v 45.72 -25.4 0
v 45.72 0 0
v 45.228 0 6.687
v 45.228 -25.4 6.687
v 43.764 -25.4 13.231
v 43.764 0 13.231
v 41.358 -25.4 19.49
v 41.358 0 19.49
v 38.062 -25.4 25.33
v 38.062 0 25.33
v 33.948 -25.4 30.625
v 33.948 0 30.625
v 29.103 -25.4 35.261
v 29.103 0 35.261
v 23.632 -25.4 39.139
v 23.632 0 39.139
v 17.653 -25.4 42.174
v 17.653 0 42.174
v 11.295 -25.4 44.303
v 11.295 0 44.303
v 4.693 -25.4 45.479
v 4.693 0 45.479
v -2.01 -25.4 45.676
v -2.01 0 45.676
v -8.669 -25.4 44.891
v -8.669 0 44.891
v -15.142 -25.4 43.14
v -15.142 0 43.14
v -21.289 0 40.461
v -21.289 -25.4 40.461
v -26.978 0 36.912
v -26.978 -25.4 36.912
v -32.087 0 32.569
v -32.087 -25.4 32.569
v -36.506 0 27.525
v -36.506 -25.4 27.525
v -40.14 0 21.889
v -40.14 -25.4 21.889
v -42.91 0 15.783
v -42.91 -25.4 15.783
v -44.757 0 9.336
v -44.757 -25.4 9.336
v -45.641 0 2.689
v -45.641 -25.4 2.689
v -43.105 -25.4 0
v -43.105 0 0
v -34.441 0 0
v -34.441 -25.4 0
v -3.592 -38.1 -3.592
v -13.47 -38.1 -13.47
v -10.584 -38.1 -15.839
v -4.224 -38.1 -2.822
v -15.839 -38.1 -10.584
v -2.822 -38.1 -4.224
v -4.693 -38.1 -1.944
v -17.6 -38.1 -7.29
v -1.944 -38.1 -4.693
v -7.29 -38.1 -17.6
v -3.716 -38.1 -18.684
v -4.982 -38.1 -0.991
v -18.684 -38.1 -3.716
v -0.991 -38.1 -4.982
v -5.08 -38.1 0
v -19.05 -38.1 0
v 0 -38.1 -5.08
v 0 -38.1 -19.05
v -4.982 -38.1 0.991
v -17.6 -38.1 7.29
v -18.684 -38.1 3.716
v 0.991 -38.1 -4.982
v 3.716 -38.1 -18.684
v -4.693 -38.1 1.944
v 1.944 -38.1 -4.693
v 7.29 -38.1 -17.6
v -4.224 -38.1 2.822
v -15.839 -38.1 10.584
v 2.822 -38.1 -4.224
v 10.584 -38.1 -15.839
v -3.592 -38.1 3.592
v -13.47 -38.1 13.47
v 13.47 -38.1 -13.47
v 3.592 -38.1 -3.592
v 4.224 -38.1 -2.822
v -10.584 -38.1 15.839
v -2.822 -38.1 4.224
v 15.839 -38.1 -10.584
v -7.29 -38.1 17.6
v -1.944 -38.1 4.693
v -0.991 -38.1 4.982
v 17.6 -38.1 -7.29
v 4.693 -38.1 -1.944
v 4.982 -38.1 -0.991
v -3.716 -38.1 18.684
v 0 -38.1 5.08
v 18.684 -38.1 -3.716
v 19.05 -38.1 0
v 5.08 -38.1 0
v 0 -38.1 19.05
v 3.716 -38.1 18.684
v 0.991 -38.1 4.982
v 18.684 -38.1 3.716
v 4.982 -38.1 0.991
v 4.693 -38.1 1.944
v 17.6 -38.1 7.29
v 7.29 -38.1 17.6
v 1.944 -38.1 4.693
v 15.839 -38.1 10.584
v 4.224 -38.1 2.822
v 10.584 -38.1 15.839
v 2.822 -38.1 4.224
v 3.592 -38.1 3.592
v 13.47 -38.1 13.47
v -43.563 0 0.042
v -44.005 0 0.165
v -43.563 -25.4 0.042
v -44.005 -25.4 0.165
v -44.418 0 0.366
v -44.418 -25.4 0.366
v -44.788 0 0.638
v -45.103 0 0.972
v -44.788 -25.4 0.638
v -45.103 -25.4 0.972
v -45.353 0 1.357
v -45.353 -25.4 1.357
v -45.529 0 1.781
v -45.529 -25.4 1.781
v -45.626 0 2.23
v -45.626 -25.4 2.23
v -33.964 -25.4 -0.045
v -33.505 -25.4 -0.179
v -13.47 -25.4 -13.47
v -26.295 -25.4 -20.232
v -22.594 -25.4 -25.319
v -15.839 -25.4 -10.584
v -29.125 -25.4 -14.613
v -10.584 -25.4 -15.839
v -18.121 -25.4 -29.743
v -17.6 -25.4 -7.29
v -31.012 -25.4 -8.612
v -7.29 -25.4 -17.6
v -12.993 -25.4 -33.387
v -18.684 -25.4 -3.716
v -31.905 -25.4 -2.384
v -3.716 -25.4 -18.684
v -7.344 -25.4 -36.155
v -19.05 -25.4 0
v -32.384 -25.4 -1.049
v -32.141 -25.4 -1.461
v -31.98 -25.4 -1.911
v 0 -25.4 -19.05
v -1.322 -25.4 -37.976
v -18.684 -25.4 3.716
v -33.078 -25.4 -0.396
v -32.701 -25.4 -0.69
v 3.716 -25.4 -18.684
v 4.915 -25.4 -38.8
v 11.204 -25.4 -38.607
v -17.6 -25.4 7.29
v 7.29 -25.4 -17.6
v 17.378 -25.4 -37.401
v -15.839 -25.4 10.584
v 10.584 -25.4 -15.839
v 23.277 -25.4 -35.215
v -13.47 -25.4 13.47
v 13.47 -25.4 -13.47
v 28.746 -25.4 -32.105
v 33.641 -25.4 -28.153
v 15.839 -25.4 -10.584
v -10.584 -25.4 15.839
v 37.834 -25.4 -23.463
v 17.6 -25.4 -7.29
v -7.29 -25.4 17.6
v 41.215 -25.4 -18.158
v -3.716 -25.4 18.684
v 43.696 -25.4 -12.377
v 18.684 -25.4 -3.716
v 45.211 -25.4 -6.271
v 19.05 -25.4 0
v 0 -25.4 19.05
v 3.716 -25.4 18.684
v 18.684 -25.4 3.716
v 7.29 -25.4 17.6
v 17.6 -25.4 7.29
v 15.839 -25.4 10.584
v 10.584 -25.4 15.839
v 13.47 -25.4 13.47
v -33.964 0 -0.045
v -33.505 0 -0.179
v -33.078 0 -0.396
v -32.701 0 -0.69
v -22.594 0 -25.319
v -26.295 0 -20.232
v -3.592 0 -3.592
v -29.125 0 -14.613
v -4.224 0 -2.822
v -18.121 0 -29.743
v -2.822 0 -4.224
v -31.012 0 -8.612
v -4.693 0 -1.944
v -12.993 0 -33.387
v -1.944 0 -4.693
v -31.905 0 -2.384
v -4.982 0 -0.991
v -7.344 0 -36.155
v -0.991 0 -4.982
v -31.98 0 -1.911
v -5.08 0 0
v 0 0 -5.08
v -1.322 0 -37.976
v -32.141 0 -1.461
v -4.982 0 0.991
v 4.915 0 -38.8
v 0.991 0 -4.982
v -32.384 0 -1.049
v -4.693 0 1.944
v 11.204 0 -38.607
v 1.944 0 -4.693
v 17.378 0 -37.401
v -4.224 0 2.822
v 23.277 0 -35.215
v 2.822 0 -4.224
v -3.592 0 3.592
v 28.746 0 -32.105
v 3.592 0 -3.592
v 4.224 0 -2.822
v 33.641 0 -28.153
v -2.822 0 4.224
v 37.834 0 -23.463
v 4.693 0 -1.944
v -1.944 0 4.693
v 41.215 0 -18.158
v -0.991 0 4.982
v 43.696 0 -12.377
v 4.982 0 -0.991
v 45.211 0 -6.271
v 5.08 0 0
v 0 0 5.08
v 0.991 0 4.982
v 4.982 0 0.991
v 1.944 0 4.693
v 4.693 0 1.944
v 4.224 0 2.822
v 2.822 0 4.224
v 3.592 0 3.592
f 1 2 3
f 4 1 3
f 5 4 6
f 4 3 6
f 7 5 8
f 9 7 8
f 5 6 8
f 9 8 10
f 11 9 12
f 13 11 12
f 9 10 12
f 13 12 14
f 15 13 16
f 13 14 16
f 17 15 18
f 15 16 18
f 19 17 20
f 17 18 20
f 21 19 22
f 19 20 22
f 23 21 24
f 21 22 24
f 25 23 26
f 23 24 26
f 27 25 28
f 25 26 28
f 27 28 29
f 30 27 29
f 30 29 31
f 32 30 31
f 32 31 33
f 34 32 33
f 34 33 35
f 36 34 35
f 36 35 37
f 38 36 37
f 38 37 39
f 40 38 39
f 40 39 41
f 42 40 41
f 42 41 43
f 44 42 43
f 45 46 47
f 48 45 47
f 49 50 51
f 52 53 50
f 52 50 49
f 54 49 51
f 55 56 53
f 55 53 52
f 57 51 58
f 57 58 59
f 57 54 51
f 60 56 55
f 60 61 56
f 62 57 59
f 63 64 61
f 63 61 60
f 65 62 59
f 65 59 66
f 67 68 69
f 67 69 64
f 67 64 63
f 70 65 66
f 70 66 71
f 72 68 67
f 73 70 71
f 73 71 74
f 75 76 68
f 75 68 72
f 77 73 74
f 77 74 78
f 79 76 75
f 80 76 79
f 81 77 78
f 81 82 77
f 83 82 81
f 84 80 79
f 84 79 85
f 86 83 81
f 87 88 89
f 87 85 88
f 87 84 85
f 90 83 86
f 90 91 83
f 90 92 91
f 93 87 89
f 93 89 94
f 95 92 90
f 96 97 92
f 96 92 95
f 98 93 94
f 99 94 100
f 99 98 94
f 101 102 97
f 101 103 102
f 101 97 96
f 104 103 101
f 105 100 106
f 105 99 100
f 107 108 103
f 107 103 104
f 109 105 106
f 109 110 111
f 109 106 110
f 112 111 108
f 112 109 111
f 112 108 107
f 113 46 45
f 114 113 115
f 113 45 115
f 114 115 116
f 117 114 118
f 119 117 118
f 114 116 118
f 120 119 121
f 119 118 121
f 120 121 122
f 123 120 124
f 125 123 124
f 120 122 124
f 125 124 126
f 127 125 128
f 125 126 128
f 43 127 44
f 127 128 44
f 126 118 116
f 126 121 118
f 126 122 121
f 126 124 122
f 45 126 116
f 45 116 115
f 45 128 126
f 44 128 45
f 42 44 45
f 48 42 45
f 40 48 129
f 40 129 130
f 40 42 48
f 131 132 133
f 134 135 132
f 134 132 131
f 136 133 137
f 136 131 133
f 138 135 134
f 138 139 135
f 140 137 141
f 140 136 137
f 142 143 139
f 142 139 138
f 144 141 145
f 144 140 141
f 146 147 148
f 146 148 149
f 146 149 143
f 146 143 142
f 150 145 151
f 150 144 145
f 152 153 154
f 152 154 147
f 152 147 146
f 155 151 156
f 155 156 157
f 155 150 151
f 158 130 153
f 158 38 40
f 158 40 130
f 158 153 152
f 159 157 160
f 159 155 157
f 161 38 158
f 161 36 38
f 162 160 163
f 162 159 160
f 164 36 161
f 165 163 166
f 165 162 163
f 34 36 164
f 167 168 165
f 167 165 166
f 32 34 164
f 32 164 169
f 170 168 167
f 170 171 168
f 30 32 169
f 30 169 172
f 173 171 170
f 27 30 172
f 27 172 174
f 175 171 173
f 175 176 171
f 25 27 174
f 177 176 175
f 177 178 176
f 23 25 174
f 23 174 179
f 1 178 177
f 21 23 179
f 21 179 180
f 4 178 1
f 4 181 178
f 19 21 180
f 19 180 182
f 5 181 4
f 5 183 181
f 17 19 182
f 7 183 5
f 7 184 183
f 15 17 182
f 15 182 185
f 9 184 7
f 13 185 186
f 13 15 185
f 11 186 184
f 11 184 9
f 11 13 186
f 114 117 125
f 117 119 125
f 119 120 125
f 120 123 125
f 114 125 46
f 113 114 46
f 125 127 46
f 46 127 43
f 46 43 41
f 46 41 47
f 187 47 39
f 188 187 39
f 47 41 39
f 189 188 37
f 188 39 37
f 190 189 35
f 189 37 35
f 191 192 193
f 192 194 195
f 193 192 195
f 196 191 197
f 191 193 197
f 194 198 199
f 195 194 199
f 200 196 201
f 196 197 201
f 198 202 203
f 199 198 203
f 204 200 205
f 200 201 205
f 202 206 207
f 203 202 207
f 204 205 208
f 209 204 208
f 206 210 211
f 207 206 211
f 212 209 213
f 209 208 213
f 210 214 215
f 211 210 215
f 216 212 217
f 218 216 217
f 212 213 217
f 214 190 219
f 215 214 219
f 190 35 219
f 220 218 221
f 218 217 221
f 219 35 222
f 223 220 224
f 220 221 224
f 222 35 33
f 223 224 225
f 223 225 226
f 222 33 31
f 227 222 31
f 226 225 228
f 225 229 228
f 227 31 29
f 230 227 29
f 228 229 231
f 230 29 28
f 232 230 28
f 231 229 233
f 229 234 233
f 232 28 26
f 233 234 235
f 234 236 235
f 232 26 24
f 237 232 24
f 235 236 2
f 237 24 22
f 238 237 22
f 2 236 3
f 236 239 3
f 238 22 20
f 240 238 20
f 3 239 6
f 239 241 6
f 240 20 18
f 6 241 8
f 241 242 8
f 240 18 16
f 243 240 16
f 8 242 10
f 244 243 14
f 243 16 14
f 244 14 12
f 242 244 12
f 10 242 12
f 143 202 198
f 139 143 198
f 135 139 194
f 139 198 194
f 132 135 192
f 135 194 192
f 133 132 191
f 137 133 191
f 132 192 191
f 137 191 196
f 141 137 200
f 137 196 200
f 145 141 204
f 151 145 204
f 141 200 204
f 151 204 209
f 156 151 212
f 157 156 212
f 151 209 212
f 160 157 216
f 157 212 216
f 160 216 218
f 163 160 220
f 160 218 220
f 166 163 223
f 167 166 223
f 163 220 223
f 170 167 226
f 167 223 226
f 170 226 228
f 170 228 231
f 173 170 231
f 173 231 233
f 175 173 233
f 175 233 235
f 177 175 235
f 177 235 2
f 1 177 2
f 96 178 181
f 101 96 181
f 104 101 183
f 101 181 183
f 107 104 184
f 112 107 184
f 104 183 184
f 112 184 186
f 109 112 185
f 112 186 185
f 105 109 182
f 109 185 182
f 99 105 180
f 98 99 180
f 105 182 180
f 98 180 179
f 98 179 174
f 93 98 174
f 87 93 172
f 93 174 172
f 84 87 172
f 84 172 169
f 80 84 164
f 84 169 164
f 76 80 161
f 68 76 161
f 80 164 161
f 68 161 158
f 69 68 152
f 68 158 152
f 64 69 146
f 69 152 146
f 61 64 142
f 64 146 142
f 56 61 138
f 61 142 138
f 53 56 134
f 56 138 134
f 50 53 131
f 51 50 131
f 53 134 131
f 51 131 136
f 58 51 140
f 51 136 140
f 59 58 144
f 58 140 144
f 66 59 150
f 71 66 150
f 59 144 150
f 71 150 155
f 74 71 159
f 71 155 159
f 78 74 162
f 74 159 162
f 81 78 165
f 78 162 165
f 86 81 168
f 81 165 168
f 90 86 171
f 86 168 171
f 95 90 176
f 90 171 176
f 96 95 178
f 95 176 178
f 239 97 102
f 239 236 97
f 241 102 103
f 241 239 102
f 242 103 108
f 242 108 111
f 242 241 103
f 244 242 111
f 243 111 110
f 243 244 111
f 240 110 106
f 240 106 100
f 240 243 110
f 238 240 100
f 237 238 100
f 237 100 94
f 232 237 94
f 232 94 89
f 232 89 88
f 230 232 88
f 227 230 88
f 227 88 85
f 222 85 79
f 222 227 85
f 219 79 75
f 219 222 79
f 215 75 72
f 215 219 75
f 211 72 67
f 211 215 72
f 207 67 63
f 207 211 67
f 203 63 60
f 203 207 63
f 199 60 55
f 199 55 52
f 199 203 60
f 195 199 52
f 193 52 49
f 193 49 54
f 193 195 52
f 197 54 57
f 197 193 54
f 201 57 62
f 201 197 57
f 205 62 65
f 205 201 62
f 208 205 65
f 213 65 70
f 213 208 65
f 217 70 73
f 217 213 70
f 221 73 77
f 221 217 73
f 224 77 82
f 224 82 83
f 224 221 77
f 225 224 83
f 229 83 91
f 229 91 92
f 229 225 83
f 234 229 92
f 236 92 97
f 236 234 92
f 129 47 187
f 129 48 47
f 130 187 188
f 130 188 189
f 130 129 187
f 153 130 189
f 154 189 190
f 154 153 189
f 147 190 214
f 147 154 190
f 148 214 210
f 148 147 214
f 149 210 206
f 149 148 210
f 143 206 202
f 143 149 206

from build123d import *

# Parameters (mm, degrees)
F1_DEPTH = 25.4
F2_R     = 5.08
F3_DEPTH = 127
F4_R     = 2.54
F5_R     = 2.54
F6_R     = 19.05
F6_R_2   = 5.08
F7_DEPTH = 12.7


with BuildPart() as f1:
    # F0 (on Front) → F1 (new body)
    with BuildSketch(Plane.XZ):
        with BuildLine():
            ThreePointArc((-31.9786, 0), (6.8707, -38.8493), (45.72, 0))
            ThreePointArc((45.72, 0), (0, 45.72), (-45.72, 0))
            Line((-45.72, 0), (-31.9786, 0))
        make_face()
    extrude(amount=F1_DEPTH)

    # F2 (on face) → F3 (cut, symmetric)
    with BuildSketch(Plane.XZ.offset(25.4)):
        Circle(F2_R)
    extrude(amount=F3_DEPTH, both=True, mode=Mode.SUBTRACT)

    # F4
    f4_edges = [f1.edges().sort_by_distance(p)[0] for p in [
        (-45.72, -12.7, 0),
    ]]
    fillet(f4_edges, radius=F4_R)

    # F5
    f5_edges = [f1.edges().sort_by_distance(p)[0] for p in [
        (-31.9786, -12.7, 0),
    ]]
    fillet(f5_edges, radius=F5_R)

    # F6 (on face) → F7 (join)
    with BuildSketch(Plane.XZ.offset(25.4)):
        Circle(F6_R)
        Circle(F6_R_2, mode=Mode.SUBTRACT)
    extrude(amount=F7_DEPTH)


solid = f1.part
